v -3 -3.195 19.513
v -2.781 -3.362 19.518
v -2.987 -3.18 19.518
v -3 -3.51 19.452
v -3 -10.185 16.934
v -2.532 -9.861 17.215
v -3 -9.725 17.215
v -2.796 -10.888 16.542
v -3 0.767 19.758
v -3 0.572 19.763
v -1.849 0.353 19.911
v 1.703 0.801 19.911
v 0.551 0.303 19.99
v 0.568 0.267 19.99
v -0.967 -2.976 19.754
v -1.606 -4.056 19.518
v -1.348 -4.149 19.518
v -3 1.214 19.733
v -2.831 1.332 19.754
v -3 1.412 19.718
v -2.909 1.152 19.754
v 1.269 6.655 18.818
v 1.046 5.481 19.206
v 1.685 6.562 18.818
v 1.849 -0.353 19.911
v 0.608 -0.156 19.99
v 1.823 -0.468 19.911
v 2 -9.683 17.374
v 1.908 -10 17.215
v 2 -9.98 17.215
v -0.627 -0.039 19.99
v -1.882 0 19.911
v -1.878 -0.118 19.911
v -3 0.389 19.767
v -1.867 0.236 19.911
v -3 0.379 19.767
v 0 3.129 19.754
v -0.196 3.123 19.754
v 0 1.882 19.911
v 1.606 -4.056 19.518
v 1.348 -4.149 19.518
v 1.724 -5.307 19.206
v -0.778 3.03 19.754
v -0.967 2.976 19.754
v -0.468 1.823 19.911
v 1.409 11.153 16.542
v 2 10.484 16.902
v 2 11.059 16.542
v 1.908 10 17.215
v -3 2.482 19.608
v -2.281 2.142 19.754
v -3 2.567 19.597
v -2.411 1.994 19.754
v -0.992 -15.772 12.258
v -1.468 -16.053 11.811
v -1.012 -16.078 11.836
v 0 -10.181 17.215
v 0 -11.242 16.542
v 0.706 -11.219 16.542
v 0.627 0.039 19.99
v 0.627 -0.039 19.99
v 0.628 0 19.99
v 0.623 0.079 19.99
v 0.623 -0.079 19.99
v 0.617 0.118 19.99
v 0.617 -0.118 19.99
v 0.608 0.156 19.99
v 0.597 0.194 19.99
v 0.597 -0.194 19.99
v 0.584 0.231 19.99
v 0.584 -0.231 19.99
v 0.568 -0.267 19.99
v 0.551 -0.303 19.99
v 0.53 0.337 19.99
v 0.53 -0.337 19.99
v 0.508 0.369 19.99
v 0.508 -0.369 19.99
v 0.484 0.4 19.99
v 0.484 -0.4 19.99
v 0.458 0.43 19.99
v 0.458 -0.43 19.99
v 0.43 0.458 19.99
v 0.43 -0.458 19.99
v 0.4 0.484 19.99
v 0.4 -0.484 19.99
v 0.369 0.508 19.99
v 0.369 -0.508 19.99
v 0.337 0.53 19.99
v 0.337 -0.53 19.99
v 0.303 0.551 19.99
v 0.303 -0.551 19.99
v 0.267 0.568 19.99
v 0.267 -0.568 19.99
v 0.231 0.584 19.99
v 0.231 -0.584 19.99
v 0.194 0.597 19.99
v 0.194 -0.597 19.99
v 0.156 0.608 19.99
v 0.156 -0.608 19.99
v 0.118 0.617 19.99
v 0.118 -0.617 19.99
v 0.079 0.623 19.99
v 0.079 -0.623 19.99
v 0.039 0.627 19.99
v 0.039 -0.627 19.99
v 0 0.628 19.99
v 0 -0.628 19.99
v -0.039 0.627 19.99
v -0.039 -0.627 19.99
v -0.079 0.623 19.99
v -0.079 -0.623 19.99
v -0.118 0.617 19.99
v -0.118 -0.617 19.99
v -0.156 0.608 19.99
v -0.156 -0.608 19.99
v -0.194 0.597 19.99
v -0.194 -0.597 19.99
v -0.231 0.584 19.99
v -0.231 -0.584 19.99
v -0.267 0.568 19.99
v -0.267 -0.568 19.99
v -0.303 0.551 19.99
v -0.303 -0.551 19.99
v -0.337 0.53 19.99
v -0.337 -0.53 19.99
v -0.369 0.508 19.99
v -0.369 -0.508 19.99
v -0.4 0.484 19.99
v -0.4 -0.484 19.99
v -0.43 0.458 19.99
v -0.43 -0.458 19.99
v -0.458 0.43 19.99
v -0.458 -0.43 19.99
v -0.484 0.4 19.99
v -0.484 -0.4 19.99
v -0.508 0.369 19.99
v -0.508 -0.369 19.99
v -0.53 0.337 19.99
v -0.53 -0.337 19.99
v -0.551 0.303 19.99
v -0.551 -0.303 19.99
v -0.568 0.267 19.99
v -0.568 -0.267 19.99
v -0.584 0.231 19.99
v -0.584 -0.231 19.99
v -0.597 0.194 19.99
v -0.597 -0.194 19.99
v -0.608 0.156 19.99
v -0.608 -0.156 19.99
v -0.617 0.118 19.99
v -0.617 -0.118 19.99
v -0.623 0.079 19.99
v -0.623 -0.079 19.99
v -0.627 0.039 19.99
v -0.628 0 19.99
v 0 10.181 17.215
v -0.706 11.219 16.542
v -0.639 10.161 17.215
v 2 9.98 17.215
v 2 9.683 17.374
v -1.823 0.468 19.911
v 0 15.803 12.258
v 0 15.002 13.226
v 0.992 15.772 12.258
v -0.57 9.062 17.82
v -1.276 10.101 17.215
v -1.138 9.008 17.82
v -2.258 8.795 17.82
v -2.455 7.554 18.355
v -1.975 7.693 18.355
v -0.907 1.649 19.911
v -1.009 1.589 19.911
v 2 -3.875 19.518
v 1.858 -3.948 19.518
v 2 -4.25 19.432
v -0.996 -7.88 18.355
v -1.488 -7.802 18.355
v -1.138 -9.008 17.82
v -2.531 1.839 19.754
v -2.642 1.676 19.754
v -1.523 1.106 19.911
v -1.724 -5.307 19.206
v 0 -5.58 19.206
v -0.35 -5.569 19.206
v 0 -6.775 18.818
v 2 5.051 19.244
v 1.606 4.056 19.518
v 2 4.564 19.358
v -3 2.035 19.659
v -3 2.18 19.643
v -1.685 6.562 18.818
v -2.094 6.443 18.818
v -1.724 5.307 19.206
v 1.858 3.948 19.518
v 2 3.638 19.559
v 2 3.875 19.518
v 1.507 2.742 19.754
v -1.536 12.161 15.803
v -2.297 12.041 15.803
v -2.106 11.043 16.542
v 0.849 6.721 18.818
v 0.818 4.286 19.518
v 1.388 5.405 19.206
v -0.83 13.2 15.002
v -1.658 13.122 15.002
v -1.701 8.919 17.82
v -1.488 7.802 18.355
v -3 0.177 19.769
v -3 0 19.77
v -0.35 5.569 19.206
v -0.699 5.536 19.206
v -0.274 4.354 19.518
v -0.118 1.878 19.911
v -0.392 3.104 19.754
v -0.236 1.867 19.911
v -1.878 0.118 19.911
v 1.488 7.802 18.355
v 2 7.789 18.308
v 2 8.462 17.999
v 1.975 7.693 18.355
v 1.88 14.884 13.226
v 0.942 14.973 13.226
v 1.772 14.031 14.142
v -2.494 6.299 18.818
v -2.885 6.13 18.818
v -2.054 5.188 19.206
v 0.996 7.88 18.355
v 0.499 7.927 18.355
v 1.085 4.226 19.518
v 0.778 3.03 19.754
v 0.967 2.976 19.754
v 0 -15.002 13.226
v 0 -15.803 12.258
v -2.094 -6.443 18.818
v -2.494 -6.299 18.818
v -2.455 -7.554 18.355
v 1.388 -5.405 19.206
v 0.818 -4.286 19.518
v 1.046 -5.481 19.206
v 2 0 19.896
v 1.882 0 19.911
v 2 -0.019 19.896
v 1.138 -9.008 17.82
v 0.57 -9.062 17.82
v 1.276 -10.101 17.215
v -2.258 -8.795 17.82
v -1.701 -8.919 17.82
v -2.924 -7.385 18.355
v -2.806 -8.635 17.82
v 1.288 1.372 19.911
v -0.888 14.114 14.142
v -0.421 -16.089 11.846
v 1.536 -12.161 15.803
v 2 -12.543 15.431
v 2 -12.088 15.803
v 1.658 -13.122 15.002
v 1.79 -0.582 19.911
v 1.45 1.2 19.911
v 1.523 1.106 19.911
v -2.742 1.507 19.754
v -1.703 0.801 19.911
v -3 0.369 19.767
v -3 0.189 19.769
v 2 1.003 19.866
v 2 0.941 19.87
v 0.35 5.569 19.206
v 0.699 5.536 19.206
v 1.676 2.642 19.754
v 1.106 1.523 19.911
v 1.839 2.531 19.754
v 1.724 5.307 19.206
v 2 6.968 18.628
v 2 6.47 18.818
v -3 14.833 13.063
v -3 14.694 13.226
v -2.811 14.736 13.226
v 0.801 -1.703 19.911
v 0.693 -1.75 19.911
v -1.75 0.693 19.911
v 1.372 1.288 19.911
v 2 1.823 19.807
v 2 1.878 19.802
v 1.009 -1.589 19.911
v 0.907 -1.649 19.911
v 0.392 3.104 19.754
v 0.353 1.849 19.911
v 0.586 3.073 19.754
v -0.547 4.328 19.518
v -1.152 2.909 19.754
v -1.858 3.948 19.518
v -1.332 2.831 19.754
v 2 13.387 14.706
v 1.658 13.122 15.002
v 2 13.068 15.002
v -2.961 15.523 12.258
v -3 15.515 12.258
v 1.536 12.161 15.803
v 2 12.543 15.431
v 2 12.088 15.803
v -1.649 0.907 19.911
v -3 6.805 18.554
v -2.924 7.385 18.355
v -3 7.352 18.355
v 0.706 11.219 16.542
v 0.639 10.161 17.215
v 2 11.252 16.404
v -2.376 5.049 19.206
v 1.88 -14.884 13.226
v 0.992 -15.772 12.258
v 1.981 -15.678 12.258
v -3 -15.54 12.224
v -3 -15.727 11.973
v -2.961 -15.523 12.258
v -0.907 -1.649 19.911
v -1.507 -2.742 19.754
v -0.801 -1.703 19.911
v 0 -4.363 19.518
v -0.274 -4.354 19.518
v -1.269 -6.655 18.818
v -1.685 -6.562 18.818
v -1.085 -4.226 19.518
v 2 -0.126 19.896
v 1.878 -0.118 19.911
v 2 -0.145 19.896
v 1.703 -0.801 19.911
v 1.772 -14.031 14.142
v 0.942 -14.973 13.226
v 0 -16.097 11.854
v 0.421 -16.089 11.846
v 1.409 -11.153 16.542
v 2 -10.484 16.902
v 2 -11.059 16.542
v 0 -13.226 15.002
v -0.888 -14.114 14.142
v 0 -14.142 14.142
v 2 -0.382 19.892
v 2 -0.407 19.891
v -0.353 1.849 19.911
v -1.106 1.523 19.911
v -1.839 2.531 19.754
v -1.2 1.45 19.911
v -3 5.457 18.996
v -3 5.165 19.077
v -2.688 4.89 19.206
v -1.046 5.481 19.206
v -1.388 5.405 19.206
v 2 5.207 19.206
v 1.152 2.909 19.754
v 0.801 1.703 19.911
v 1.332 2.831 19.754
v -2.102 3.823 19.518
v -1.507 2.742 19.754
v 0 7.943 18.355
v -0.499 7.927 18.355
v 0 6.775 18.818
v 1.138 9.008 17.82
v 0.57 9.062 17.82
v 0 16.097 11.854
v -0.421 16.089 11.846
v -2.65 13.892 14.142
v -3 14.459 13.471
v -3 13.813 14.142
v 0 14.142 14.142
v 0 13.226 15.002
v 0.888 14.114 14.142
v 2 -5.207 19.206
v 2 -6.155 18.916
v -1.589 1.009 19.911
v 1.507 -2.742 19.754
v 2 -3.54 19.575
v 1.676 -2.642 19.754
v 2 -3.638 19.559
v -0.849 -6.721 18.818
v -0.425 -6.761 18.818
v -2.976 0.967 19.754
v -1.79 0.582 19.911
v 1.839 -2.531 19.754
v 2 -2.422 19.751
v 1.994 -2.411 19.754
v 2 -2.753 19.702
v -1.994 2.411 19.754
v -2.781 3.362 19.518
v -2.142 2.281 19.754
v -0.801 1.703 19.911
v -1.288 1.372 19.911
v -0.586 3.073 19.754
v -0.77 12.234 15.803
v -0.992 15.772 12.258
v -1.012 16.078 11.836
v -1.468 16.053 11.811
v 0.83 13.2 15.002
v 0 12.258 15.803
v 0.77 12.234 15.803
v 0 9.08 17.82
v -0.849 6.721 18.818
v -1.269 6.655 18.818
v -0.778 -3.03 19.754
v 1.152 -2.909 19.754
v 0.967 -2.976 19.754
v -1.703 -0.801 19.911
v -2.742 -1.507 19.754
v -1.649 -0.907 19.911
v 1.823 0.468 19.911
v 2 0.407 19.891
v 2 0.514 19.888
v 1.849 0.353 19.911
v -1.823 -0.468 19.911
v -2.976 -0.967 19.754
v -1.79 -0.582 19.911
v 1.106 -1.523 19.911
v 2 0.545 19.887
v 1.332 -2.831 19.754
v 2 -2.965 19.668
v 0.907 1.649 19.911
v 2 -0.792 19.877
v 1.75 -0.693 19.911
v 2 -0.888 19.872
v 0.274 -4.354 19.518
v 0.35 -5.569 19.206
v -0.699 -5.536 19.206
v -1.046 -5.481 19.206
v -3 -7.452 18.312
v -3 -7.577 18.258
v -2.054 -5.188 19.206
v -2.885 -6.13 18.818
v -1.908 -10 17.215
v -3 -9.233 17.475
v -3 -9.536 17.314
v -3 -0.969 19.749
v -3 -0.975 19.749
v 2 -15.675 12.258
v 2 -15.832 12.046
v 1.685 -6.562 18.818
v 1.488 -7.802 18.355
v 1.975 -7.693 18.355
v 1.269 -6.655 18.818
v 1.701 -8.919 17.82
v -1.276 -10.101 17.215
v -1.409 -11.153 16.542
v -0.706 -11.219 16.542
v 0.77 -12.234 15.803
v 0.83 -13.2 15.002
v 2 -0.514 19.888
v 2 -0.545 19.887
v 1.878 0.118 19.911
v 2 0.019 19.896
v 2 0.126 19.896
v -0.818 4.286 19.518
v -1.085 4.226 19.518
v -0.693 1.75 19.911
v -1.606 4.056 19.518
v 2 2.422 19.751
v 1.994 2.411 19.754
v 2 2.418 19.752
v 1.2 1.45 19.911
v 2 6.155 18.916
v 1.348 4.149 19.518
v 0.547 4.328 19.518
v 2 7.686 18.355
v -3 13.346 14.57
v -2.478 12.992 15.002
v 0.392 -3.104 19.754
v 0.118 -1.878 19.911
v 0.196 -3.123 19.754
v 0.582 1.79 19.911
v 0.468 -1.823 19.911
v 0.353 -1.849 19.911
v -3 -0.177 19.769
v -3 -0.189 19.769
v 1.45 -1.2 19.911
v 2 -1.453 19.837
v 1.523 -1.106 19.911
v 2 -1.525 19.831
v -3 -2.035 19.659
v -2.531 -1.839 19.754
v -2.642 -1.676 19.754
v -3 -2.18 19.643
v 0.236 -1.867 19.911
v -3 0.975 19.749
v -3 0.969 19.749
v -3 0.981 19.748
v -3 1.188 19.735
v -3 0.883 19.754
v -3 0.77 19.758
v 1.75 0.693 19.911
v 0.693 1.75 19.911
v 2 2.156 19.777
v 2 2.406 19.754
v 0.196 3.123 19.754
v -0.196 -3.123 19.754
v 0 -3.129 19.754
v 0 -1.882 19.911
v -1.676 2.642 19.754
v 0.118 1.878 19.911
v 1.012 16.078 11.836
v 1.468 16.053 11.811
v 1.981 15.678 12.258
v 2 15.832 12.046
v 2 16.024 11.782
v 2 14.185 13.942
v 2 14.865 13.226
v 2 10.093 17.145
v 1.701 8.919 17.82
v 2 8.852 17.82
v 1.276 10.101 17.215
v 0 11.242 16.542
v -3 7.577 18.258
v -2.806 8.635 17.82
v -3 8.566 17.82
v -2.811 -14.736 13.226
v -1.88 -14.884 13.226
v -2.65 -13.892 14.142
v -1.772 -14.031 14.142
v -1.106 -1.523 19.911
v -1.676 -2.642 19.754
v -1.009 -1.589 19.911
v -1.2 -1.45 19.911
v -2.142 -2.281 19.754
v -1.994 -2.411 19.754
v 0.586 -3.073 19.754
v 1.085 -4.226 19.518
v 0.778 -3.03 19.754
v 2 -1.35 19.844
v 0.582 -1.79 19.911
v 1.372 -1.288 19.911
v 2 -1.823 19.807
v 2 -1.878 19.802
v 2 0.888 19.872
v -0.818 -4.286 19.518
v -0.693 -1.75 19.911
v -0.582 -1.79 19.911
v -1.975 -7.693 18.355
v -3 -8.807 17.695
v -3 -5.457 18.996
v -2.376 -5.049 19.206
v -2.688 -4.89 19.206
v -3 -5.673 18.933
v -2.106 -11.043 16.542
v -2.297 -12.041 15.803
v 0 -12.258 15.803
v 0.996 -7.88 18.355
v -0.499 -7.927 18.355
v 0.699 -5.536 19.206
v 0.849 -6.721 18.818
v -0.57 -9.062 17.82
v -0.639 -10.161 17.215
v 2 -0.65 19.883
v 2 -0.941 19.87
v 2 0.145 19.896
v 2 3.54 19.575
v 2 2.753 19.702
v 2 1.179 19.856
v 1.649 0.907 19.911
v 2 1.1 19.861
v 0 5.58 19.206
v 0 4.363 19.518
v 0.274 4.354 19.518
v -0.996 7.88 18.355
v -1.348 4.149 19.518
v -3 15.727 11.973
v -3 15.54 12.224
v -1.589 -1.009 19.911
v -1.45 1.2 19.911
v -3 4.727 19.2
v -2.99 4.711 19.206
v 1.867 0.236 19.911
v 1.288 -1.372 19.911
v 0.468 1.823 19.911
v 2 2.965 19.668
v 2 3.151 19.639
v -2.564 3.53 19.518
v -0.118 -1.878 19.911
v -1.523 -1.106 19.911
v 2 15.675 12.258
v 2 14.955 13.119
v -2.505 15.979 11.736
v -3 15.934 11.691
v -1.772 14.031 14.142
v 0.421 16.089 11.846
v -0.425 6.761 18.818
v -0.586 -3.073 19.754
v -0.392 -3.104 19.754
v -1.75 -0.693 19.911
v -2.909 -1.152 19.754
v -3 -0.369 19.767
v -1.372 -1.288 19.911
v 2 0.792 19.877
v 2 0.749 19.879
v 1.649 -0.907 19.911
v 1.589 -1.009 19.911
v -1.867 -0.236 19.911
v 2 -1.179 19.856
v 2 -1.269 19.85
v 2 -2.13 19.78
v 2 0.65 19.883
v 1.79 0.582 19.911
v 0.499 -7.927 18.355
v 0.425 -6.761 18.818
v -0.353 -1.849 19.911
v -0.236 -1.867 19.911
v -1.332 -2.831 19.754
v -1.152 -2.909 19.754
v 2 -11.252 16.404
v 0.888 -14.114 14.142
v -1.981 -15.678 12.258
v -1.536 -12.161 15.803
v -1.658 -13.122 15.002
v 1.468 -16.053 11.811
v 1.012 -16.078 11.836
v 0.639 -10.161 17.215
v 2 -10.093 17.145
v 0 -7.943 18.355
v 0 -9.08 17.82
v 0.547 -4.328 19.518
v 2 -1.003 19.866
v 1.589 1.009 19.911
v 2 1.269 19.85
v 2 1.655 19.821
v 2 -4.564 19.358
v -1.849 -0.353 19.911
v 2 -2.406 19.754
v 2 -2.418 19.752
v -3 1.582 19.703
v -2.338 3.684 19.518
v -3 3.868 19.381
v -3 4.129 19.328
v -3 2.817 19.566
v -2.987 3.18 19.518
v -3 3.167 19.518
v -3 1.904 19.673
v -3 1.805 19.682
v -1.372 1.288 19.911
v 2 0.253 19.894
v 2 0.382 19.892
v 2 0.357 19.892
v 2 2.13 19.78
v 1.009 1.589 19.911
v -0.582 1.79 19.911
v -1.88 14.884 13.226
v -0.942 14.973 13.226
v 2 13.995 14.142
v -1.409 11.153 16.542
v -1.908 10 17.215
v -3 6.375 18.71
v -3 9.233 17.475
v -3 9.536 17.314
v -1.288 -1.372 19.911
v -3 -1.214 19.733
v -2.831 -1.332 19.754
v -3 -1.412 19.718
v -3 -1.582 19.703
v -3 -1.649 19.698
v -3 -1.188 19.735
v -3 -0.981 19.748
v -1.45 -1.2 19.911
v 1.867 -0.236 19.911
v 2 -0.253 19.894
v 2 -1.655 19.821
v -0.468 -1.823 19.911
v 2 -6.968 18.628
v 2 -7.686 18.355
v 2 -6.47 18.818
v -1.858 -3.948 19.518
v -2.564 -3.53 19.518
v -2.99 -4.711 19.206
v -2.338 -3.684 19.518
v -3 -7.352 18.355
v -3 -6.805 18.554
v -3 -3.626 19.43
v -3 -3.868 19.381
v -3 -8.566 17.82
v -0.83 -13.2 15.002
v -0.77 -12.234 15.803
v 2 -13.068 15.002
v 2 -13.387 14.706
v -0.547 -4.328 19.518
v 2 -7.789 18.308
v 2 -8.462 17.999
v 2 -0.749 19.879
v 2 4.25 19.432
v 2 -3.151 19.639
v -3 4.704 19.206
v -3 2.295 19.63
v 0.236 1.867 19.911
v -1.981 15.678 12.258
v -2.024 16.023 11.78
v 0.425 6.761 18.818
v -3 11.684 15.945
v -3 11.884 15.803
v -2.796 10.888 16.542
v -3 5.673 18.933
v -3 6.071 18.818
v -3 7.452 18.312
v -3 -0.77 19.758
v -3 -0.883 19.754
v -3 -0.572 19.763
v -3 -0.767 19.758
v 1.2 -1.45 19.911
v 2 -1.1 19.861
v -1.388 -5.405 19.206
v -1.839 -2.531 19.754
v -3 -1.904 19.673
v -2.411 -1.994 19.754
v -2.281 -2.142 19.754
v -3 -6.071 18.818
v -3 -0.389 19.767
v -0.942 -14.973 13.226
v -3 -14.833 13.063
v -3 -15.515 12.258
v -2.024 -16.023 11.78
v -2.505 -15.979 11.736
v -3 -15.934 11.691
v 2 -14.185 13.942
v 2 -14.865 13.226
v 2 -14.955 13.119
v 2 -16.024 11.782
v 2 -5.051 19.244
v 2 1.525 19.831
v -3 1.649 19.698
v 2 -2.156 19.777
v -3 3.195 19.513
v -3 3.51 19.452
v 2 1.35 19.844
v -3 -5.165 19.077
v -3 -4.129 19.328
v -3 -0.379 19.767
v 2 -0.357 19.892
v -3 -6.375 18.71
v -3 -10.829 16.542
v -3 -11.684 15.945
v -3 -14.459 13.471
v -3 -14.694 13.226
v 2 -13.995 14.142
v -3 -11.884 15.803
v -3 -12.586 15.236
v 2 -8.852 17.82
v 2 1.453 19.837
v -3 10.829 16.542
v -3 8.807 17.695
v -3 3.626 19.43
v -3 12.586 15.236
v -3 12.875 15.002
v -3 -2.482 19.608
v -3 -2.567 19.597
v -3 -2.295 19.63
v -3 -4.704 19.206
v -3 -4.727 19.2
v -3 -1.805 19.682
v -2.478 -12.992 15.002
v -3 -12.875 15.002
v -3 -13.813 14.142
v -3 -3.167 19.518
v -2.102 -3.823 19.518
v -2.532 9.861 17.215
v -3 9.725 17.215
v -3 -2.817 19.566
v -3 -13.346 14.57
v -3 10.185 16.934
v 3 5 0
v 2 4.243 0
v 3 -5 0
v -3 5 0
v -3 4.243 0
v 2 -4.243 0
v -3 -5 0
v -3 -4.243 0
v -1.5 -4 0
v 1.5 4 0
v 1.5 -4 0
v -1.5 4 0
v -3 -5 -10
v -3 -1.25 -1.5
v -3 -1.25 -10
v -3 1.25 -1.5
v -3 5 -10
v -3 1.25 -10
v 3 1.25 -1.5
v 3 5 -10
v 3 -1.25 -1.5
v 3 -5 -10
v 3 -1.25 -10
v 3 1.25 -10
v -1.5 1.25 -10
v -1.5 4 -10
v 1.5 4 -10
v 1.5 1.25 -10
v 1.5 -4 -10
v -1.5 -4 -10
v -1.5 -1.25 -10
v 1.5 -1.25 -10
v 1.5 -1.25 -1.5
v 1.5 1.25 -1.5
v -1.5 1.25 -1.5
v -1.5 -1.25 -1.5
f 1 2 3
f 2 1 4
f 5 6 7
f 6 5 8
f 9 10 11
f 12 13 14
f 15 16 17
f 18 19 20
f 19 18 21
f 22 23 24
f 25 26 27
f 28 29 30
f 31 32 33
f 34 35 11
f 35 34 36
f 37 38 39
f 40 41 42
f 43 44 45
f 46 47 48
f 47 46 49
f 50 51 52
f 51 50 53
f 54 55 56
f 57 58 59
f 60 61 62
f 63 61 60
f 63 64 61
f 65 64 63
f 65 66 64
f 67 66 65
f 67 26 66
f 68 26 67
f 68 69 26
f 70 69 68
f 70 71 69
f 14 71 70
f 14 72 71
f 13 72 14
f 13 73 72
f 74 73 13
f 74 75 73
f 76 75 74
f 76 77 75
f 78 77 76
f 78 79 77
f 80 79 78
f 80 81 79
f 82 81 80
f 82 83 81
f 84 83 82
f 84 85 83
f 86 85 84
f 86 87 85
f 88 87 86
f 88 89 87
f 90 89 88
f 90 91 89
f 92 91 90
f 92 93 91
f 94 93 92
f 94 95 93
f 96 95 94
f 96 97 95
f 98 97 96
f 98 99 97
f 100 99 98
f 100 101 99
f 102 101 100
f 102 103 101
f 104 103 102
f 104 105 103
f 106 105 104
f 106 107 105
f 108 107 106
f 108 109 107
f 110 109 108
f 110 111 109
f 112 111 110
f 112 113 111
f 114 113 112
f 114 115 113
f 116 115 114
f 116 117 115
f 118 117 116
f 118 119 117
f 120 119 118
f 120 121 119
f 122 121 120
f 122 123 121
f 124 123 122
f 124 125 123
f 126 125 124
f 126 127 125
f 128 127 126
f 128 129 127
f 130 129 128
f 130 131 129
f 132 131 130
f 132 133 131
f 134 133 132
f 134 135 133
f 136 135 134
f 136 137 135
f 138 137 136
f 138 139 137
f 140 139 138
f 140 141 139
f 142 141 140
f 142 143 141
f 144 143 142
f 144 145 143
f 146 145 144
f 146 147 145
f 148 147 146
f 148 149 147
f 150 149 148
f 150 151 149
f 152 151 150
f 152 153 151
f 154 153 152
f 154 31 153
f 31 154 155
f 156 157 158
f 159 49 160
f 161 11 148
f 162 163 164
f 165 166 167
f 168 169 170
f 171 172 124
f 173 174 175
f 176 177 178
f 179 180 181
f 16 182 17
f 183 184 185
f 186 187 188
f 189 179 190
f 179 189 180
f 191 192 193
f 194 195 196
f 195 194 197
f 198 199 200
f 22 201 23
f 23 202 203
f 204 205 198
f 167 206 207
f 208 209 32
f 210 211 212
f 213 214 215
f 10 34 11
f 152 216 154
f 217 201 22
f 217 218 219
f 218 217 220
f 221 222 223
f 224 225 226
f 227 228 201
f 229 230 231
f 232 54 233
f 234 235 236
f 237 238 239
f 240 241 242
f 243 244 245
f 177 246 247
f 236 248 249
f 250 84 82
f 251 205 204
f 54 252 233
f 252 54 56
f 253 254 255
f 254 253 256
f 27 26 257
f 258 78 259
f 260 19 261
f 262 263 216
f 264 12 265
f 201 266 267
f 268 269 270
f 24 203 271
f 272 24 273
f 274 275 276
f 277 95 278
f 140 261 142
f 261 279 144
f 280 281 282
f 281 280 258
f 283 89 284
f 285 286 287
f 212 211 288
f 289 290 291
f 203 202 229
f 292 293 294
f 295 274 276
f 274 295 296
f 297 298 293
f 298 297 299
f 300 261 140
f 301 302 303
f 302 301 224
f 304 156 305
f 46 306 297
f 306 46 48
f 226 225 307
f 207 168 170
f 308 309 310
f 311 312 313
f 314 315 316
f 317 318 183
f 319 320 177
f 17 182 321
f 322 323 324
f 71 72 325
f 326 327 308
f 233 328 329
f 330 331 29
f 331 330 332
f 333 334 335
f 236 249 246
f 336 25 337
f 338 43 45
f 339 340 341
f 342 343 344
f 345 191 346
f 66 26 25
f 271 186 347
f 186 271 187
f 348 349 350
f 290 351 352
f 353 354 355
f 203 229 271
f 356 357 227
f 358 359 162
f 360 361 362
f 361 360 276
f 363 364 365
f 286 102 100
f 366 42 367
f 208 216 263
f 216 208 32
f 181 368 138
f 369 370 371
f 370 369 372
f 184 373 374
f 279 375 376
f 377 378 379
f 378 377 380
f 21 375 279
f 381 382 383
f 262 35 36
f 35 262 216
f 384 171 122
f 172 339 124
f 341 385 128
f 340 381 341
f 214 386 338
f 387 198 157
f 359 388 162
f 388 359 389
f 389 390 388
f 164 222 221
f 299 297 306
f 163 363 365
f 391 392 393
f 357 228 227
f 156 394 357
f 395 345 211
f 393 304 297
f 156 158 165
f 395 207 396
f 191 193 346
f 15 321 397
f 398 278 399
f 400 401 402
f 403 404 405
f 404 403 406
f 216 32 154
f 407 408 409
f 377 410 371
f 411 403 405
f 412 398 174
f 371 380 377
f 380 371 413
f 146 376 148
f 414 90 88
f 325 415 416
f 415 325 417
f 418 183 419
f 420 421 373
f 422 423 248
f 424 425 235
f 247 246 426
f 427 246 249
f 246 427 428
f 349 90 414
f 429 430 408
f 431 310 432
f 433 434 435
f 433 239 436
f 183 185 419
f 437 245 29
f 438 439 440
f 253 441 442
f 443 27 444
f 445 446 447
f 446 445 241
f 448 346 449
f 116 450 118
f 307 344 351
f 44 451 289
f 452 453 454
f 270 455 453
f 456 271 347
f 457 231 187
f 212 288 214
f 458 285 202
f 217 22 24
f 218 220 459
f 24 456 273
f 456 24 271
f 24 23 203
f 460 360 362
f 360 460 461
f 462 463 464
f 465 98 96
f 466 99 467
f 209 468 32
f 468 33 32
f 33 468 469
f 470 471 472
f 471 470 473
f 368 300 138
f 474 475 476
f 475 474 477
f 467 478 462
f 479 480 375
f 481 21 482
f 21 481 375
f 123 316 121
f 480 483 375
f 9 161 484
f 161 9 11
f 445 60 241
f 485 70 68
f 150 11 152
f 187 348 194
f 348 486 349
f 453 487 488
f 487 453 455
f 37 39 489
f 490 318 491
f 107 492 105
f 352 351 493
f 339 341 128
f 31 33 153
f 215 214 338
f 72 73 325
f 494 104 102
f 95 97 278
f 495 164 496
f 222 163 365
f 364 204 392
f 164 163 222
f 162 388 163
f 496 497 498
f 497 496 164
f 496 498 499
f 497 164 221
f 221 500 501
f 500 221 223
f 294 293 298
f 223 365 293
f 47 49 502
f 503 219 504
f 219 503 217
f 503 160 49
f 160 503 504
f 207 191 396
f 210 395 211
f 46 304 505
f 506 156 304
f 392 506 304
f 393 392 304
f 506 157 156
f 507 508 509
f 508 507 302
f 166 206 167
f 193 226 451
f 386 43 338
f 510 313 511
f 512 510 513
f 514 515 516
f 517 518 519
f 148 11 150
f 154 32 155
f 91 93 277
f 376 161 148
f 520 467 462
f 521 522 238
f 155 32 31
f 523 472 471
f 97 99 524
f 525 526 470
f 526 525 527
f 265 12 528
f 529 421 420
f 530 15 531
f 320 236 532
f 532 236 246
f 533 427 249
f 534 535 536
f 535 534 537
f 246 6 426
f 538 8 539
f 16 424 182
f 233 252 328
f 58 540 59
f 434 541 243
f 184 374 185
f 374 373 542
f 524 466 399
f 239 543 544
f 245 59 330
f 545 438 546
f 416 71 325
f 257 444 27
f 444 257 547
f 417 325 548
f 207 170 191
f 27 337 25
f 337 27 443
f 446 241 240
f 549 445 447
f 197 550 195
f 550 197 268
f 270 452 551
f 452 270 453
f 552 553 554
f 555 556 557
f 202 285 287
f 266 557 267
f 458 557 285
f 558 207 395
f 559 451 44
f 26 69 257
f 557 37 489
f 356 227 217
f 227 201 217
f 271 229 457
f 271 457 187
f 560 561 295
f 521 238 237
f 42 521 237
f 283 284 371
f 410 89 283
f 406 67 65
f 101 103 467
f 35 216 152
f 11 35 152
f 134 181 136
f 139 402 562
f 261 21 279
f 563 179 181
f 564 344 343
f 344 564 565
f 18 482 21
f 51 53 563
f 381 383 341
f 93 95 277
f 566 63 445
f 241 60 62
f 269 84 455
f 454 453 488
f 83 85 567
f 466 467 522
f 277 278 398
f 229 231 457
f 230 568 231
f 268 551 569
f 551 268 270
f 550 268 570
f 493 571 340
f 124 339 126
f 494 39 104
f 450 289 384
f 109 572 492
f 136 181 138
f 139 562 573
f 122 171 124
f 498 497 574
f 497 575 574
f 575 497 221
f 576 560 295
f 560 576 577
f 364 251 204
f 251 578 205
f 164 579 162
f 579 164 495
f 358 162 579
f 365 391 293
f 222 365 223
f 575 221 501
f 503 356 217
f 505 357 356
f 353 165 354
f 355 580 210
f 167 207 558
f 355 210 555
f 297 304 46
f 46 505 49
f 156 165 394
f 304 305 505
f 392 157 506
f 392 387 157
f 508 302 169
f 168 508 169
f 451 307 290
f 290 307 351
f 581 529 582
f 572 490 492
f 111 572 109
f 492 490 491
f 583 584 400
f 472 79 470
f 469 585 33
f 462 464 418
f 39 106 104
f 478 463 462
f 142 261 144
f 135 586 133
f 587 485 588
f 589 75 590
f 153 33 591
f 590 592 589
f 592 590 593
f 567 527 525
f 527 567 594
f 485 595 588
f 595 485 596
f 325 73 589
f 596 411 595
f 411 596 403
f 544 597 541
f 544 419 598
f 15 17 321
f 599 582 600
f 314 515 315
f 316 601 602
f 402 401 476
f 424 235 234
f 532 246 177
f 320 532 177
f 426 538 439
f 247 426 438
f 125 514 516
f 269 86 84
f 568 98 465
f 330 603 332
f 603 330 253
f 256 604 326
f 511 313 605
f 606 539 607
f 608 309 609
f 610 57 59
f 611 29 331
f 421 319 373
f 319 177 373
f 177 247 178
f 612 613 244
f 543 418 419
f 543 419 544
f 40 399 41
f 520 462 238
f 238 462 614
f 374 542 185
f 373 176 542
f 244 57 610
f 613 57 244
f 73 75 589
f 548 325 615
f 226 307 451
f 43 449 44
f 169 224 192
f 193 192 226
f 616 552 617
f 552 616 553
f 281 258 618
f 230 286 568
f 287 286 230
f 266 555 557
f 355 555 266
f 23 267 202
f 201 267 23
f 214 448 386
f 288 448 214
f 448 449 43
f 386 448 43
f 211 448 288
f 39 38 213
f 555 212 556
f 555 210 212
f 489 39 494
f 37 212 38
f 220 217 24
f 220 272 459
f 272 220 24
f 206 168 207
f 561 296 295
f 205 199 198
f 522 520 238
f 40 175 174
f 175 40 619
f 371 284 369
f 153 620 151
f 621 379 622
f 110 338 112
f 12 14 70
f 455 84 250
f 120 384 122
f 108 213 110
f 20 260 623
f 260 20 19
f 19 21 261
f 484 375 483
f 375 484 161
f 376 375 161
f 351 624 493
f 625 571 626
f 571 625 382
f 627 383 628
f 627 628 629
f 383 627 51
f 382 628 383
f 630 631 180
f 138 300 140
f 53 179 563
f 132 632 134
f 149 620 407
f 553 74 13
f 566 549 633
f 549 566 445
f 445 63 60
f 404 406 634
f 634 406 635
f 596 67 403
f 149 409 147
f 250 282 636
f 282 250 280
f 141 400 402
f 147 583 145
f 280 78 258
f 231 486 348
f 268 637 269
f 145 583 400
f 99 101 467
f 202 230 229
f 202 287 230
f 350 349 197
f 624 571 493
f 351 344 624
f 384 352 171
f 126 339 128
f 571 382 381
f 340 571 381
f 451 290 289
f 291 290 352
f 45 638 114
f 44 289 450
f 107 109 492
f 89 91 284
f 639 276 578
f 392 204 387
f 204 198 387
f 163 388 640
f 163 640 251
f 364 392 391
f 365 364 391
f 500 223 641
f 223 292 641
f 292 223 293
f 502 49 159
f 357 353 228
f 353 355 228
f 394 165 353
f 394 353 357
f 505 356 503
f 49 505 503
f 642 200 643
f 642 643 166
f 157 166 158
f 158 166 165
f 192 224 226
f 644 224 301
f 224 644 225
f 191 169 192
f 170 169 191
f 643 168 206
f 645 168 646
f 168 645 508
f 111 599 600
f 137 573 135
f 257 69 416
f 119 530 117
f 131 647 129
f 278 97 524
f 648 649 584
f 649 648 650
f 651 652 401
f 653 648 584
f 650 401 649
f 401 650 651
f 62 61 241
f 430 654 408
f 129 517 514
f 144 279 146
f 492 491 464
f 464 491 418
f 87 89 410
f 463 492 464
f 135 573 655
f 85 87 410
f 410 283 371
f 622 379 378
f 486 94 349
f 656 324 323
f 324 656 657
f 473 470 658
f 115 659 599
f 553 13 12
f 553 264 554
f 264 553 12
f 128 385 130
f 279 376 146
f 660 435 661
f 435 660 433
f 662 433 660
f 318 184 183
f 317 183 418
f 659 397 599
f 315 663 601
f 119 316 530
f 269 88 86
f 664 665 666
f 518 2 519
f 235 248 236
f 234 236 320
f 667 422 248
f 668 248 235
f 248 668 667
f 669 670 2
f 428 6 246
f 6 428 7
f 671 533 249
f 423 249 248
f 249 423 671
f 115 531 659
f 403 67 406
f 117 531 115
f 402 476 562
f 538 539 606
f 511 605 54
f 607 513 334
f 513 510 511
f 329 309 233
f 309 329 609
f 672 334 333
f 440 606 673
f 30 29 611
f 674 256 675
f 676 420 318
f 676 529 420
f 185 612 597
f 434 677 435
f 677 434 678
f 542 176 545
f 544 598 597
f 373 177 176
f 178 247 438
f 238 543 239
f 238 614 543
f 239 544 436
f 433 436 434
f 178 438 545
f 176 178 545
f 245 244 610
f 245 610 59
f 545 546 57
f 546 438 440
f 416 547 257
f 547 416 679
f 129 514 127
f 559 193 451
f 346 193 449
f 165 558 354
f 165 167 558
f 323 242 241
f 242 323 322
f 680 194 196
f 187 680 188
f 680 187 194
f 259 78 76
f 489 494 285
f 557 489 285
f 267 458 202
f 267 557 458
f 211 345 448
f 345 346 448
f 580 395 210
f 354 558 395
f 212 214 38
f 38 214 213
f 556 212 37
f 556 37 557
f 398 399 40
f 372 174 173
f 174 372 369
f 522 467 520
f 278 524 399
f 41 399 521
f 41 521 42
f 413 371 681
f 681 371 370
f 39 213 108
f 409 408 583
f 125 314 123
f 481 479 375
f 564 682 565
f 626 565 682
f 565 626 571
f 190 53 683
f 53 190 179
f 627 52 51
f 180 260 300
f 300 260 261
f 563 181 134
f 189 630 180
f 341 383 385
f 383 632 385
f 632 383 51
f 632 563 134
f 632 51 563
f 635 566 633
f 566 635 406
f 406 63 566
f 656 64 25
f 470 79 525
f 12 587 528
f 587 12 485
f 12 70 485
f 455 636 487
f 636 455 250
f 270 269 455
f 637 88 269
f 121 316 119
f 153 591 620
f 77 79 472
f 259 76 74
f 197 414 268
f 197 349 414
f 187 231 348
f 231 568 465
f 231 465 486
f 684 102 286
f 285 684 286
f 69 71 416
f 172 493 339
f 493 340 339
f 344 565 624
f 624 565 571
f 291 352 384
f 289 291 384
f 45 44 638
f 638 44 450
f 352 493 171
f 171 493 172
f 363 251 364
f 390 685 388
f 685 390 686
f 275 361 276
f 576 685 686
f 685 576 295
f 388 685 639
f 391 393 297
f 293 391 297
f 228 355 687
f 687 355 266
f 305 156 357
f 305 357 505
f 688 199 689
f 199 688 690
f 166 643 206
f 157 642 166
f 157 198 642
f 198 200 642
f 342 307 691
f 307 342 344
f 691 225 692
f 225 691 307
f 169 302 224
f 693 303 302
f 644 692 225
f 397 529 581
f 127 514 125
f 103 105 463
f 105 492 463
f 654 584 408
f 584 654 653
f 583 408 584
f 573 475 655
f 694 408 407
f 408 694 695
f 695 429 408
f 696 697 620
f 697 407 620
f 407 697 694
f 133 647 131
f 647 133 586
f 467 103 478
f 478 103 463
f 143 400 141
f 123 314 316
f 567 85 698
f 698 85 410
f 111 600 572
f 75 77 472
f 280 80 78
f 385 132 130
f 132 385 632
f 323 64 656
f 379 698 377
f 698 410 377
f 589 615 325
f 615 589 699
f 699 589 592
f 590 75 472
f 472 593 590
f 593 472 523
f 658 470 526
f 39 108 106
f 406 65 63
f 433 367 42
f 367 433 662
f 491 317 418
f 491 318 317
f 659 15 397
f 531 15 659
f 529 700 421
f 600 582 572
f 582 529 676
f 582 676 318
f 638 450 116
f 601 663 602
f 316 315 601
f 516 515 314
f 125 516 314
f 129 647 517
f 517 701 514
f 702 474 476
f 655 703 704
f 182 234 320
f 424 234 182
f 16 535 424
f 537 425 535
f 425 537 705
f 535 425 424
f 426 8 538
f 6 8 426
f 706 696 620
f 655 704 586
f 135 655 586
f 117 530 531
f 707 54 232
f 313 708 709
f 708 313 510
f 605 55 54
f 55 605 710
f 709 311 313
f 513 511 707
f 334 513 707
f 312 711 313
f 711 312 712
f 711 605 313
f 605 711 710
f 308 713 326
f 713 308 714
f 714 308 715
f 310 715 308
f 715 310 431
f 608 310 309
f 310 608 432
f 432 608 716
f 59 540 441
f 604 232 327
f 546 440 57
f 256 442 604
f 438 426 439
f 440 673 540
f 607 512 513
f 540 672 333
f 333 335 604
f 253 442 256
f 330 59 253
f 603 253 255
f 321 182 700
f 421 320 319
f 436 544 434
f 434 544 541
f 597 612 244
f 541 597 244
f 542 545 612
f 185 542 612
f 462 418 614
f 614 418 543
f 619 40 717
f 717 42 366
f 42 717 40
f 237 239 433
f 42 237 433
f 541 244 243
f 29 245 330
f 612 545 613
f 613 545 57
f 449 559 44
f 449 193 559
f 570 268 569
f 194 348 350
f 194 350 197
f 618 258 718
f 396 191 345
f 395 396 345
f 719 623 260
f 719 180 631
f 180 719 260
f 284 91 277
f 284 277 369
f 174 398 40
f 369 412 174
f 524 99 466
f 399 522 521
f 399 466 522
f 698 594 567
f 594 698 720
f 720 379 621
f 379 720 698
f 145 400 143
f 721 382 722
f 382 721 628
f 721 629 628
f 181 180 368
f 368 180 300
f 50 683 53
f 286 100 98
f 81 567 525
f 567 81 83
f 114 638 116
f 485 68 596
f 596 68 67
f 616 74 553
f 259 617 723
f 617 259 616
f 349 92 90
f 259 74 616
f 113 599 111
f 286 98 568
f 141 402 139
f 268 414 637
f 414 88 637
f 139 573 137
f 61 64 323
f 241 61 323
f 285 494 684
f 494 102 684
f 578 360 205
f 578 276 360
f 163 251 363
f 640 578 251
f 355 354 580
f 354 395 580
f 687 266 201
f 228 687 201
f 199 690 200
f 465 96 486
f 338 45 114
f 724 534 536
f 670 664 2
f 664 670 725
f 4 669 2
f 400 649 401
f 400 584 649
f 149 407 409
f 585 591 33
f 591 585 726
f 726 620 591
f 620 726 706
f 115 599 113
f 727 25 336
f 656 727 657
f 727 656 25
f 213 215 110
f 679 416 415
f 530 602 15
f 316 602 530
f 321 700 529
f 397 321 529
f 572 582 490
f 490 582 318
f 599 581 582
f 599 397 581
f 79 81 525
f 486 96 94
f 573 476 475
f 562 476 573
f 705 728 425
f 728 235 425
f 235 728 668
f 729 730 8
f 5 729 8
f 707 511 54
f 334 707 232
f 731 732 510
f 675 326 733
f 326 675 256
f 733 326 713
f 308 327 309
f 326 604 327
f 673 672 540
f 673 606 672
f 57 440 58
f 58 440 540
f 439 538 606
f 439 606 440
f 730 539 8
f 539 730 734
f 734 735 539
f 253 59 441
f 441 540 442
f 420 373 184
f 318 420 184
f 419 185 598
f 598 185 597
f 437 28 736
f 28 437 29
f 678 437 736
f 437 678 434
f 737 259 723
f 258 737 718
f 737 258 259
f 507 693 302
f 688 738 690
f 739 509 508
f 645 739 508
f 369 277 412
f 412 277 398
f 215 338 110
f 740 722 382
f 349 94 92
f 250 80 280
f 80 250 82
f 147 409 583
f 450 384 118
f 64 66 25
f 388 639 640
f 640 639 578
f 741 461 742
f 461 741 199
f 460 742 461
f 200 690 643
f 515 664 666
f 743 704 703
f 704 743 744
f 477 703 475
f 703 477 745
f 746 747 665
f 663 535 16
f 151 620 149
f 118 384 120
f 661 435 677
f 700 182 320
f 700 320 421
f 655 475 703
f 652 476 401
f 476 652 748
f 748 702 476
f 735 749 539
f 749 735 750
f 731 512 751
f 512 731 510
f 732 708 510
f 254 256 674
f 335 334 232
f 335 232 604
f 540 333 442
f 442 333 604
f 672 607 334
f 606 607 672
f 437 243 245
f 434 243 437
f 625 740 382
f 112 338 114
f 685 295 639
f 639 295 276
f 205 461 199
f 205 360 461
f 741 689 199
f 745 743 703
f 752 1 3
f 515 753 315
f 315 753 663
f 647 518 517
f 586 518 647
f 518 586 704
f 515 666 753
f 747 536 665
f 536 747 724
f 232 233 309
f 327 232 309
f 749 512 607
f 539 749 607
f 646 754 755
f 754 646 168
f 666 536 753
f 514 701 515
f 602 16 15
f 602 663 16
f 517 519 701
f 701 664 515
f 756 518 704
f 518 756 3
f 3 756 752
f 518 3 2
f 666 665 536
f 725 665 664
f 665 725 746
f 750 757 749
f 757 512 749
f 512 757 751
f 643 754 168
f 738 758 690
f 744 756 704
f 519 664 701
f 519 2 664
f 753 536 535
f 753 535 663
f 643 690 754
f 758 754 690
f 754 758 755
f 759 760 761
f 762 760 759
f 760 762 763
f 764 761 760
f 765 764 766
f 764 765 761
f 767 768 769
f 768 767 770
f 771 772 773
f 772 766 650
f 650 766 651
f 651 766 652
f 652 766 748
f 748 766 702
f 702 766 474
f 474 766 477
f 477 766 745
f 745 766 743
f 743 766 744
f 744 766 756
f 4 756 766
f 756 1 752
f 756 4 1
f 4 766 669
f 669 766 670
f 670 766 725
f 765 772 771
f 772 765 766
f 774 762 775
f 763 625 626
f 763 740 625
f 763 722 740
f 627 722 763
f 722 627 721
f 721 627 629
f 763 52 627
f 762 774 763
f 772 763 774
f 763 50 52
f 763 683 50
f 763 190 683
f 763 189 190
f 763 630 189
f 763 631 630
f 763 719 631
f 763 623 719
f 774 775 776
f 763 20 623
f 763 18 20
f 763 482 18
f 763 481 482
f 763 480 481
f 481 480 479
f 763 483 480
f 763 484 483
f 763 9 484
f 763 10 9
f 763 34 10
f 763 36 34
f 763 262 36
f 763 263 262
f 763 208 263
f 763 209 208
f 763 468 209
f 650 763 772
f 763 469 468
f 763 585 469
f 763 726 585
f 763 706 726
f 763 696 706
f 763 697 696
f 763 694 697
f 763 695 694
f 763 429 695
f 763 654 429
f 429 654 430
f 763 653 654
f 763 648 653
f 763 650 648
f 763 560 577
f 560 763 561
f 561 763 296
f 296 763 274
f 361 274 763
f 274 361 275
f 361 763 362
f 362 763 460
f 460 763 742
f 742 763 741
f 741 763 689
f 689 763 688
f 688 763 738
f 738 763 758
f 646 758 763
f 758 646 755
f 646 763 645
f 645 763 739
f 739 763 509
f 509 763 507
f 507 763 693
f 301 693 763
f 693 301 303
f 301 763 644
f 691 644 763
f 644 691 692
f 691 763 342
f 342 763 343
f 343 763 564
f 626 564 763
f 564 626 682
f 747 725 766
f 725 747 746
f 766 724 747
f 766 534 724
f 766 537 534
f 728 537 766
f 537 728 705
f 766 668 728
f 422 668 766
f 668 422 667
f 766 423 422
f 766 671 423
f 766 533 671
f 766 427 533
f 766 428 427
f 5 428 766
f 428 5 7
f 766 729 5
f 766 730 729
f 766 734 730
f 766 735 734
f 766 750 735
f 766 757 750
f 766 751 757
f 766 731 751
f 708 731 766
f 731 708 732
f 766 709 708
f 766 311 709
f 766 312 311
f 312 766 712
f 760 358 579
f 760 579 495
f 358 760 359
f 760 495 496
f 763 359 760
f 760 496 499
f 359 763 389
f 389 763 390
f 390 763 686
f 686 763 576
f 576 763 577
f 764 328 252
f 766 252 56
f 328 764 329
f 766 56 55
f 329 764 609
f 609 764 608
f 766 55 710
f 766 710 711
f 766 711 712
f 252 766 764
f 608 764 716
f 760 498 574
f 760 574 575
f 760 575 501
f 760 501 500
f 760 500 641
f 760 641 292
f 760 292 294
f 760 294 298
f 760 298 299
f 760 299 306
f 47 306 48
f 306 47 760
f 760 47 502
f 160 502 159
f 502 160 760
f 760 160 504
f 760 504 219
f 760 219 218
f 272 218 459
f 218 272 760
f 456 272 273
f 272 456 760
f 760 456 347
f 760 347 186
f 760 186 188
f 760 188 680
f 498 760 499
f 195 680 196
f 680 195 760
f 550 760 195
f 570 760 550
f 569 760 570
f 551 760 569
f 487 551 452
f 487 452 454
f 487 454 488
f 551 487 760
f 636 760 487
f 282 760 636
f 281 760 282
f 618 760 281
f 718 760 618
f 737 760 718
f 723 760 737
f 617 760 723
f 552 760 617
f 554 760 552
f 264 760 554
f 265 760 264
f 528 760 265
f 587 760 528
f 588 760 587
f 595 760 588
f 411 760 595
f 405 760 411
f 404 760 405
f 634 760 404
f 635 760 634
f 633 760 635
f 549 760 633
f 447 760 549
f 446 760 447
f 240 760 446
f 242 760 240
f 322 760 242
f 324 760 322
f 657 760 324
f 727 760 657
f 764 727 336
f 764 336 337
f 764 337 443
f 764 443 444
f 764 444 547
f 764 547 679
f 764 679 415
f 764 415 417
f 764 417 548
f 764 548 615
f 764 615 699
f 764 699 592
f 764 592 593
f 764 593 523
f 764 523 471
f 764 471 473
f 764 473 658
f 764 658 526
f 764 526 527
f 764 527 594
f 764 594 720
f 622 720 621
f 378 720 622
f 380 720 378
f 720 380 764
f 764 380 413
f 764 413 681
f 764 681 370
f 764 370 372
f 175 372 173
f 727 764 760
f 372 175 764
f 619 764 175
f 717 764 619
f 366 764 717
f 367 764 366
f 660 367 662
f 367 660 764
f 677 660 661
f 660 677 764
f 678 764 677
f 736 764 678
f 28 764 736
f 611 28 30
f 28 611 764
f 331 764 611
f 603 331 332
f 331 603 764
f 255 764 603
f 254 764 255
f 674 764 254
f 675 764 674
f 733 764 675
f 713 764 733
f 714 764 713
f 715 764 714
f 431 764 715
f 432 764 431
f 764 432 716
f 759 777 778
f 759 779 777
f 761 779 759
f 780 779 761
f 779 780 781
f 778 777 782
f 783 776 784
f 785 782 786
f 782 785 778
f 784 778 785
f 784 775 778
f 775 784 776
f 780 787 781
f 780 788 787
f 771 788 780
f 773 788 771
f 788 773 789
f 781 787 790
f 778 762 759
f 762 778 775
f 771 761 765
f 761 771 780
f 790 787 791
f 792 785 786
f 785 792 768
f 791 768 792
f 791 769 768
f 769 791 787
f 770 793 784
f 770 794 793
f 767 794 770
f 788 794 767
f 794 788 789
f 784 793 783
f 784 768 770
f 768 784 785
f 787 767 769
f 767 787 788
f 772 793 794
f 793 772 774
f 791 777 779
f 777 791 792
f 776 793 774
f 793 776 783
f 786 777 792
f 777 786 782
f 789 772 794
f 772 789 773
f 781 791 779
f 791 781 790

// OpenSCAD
connector_height = 10;
connector_width = 10;
connector_thickness = 6;
cross_1_thickness = 3;
cross_2_thickness = 2.5;

union(){
intersection(){
difference()
{
    sphere(r=20, center = true, $fn=100);
    translate([-20,-20,-40]) cube([40,40,40]); //bottom
   
}
 rotate([45,0,0])
        translate([-3,-3,-3]) cube([5,30,30]); //border
}
translate([0,0,-connector_height/2])
    difference(){
        cube([connector_thickness,connector_width,connector_height], center = true); // bottom cube
        cube([cross_1_thickness,connector_width-2,connector_height], center=true); // partial cut
        translate([0,0,-1]) // complete cut
            rotate([0,0,90]) cube([cross_2_thickness,connector_width-2,connector_height-1], center =true);
        }
}
